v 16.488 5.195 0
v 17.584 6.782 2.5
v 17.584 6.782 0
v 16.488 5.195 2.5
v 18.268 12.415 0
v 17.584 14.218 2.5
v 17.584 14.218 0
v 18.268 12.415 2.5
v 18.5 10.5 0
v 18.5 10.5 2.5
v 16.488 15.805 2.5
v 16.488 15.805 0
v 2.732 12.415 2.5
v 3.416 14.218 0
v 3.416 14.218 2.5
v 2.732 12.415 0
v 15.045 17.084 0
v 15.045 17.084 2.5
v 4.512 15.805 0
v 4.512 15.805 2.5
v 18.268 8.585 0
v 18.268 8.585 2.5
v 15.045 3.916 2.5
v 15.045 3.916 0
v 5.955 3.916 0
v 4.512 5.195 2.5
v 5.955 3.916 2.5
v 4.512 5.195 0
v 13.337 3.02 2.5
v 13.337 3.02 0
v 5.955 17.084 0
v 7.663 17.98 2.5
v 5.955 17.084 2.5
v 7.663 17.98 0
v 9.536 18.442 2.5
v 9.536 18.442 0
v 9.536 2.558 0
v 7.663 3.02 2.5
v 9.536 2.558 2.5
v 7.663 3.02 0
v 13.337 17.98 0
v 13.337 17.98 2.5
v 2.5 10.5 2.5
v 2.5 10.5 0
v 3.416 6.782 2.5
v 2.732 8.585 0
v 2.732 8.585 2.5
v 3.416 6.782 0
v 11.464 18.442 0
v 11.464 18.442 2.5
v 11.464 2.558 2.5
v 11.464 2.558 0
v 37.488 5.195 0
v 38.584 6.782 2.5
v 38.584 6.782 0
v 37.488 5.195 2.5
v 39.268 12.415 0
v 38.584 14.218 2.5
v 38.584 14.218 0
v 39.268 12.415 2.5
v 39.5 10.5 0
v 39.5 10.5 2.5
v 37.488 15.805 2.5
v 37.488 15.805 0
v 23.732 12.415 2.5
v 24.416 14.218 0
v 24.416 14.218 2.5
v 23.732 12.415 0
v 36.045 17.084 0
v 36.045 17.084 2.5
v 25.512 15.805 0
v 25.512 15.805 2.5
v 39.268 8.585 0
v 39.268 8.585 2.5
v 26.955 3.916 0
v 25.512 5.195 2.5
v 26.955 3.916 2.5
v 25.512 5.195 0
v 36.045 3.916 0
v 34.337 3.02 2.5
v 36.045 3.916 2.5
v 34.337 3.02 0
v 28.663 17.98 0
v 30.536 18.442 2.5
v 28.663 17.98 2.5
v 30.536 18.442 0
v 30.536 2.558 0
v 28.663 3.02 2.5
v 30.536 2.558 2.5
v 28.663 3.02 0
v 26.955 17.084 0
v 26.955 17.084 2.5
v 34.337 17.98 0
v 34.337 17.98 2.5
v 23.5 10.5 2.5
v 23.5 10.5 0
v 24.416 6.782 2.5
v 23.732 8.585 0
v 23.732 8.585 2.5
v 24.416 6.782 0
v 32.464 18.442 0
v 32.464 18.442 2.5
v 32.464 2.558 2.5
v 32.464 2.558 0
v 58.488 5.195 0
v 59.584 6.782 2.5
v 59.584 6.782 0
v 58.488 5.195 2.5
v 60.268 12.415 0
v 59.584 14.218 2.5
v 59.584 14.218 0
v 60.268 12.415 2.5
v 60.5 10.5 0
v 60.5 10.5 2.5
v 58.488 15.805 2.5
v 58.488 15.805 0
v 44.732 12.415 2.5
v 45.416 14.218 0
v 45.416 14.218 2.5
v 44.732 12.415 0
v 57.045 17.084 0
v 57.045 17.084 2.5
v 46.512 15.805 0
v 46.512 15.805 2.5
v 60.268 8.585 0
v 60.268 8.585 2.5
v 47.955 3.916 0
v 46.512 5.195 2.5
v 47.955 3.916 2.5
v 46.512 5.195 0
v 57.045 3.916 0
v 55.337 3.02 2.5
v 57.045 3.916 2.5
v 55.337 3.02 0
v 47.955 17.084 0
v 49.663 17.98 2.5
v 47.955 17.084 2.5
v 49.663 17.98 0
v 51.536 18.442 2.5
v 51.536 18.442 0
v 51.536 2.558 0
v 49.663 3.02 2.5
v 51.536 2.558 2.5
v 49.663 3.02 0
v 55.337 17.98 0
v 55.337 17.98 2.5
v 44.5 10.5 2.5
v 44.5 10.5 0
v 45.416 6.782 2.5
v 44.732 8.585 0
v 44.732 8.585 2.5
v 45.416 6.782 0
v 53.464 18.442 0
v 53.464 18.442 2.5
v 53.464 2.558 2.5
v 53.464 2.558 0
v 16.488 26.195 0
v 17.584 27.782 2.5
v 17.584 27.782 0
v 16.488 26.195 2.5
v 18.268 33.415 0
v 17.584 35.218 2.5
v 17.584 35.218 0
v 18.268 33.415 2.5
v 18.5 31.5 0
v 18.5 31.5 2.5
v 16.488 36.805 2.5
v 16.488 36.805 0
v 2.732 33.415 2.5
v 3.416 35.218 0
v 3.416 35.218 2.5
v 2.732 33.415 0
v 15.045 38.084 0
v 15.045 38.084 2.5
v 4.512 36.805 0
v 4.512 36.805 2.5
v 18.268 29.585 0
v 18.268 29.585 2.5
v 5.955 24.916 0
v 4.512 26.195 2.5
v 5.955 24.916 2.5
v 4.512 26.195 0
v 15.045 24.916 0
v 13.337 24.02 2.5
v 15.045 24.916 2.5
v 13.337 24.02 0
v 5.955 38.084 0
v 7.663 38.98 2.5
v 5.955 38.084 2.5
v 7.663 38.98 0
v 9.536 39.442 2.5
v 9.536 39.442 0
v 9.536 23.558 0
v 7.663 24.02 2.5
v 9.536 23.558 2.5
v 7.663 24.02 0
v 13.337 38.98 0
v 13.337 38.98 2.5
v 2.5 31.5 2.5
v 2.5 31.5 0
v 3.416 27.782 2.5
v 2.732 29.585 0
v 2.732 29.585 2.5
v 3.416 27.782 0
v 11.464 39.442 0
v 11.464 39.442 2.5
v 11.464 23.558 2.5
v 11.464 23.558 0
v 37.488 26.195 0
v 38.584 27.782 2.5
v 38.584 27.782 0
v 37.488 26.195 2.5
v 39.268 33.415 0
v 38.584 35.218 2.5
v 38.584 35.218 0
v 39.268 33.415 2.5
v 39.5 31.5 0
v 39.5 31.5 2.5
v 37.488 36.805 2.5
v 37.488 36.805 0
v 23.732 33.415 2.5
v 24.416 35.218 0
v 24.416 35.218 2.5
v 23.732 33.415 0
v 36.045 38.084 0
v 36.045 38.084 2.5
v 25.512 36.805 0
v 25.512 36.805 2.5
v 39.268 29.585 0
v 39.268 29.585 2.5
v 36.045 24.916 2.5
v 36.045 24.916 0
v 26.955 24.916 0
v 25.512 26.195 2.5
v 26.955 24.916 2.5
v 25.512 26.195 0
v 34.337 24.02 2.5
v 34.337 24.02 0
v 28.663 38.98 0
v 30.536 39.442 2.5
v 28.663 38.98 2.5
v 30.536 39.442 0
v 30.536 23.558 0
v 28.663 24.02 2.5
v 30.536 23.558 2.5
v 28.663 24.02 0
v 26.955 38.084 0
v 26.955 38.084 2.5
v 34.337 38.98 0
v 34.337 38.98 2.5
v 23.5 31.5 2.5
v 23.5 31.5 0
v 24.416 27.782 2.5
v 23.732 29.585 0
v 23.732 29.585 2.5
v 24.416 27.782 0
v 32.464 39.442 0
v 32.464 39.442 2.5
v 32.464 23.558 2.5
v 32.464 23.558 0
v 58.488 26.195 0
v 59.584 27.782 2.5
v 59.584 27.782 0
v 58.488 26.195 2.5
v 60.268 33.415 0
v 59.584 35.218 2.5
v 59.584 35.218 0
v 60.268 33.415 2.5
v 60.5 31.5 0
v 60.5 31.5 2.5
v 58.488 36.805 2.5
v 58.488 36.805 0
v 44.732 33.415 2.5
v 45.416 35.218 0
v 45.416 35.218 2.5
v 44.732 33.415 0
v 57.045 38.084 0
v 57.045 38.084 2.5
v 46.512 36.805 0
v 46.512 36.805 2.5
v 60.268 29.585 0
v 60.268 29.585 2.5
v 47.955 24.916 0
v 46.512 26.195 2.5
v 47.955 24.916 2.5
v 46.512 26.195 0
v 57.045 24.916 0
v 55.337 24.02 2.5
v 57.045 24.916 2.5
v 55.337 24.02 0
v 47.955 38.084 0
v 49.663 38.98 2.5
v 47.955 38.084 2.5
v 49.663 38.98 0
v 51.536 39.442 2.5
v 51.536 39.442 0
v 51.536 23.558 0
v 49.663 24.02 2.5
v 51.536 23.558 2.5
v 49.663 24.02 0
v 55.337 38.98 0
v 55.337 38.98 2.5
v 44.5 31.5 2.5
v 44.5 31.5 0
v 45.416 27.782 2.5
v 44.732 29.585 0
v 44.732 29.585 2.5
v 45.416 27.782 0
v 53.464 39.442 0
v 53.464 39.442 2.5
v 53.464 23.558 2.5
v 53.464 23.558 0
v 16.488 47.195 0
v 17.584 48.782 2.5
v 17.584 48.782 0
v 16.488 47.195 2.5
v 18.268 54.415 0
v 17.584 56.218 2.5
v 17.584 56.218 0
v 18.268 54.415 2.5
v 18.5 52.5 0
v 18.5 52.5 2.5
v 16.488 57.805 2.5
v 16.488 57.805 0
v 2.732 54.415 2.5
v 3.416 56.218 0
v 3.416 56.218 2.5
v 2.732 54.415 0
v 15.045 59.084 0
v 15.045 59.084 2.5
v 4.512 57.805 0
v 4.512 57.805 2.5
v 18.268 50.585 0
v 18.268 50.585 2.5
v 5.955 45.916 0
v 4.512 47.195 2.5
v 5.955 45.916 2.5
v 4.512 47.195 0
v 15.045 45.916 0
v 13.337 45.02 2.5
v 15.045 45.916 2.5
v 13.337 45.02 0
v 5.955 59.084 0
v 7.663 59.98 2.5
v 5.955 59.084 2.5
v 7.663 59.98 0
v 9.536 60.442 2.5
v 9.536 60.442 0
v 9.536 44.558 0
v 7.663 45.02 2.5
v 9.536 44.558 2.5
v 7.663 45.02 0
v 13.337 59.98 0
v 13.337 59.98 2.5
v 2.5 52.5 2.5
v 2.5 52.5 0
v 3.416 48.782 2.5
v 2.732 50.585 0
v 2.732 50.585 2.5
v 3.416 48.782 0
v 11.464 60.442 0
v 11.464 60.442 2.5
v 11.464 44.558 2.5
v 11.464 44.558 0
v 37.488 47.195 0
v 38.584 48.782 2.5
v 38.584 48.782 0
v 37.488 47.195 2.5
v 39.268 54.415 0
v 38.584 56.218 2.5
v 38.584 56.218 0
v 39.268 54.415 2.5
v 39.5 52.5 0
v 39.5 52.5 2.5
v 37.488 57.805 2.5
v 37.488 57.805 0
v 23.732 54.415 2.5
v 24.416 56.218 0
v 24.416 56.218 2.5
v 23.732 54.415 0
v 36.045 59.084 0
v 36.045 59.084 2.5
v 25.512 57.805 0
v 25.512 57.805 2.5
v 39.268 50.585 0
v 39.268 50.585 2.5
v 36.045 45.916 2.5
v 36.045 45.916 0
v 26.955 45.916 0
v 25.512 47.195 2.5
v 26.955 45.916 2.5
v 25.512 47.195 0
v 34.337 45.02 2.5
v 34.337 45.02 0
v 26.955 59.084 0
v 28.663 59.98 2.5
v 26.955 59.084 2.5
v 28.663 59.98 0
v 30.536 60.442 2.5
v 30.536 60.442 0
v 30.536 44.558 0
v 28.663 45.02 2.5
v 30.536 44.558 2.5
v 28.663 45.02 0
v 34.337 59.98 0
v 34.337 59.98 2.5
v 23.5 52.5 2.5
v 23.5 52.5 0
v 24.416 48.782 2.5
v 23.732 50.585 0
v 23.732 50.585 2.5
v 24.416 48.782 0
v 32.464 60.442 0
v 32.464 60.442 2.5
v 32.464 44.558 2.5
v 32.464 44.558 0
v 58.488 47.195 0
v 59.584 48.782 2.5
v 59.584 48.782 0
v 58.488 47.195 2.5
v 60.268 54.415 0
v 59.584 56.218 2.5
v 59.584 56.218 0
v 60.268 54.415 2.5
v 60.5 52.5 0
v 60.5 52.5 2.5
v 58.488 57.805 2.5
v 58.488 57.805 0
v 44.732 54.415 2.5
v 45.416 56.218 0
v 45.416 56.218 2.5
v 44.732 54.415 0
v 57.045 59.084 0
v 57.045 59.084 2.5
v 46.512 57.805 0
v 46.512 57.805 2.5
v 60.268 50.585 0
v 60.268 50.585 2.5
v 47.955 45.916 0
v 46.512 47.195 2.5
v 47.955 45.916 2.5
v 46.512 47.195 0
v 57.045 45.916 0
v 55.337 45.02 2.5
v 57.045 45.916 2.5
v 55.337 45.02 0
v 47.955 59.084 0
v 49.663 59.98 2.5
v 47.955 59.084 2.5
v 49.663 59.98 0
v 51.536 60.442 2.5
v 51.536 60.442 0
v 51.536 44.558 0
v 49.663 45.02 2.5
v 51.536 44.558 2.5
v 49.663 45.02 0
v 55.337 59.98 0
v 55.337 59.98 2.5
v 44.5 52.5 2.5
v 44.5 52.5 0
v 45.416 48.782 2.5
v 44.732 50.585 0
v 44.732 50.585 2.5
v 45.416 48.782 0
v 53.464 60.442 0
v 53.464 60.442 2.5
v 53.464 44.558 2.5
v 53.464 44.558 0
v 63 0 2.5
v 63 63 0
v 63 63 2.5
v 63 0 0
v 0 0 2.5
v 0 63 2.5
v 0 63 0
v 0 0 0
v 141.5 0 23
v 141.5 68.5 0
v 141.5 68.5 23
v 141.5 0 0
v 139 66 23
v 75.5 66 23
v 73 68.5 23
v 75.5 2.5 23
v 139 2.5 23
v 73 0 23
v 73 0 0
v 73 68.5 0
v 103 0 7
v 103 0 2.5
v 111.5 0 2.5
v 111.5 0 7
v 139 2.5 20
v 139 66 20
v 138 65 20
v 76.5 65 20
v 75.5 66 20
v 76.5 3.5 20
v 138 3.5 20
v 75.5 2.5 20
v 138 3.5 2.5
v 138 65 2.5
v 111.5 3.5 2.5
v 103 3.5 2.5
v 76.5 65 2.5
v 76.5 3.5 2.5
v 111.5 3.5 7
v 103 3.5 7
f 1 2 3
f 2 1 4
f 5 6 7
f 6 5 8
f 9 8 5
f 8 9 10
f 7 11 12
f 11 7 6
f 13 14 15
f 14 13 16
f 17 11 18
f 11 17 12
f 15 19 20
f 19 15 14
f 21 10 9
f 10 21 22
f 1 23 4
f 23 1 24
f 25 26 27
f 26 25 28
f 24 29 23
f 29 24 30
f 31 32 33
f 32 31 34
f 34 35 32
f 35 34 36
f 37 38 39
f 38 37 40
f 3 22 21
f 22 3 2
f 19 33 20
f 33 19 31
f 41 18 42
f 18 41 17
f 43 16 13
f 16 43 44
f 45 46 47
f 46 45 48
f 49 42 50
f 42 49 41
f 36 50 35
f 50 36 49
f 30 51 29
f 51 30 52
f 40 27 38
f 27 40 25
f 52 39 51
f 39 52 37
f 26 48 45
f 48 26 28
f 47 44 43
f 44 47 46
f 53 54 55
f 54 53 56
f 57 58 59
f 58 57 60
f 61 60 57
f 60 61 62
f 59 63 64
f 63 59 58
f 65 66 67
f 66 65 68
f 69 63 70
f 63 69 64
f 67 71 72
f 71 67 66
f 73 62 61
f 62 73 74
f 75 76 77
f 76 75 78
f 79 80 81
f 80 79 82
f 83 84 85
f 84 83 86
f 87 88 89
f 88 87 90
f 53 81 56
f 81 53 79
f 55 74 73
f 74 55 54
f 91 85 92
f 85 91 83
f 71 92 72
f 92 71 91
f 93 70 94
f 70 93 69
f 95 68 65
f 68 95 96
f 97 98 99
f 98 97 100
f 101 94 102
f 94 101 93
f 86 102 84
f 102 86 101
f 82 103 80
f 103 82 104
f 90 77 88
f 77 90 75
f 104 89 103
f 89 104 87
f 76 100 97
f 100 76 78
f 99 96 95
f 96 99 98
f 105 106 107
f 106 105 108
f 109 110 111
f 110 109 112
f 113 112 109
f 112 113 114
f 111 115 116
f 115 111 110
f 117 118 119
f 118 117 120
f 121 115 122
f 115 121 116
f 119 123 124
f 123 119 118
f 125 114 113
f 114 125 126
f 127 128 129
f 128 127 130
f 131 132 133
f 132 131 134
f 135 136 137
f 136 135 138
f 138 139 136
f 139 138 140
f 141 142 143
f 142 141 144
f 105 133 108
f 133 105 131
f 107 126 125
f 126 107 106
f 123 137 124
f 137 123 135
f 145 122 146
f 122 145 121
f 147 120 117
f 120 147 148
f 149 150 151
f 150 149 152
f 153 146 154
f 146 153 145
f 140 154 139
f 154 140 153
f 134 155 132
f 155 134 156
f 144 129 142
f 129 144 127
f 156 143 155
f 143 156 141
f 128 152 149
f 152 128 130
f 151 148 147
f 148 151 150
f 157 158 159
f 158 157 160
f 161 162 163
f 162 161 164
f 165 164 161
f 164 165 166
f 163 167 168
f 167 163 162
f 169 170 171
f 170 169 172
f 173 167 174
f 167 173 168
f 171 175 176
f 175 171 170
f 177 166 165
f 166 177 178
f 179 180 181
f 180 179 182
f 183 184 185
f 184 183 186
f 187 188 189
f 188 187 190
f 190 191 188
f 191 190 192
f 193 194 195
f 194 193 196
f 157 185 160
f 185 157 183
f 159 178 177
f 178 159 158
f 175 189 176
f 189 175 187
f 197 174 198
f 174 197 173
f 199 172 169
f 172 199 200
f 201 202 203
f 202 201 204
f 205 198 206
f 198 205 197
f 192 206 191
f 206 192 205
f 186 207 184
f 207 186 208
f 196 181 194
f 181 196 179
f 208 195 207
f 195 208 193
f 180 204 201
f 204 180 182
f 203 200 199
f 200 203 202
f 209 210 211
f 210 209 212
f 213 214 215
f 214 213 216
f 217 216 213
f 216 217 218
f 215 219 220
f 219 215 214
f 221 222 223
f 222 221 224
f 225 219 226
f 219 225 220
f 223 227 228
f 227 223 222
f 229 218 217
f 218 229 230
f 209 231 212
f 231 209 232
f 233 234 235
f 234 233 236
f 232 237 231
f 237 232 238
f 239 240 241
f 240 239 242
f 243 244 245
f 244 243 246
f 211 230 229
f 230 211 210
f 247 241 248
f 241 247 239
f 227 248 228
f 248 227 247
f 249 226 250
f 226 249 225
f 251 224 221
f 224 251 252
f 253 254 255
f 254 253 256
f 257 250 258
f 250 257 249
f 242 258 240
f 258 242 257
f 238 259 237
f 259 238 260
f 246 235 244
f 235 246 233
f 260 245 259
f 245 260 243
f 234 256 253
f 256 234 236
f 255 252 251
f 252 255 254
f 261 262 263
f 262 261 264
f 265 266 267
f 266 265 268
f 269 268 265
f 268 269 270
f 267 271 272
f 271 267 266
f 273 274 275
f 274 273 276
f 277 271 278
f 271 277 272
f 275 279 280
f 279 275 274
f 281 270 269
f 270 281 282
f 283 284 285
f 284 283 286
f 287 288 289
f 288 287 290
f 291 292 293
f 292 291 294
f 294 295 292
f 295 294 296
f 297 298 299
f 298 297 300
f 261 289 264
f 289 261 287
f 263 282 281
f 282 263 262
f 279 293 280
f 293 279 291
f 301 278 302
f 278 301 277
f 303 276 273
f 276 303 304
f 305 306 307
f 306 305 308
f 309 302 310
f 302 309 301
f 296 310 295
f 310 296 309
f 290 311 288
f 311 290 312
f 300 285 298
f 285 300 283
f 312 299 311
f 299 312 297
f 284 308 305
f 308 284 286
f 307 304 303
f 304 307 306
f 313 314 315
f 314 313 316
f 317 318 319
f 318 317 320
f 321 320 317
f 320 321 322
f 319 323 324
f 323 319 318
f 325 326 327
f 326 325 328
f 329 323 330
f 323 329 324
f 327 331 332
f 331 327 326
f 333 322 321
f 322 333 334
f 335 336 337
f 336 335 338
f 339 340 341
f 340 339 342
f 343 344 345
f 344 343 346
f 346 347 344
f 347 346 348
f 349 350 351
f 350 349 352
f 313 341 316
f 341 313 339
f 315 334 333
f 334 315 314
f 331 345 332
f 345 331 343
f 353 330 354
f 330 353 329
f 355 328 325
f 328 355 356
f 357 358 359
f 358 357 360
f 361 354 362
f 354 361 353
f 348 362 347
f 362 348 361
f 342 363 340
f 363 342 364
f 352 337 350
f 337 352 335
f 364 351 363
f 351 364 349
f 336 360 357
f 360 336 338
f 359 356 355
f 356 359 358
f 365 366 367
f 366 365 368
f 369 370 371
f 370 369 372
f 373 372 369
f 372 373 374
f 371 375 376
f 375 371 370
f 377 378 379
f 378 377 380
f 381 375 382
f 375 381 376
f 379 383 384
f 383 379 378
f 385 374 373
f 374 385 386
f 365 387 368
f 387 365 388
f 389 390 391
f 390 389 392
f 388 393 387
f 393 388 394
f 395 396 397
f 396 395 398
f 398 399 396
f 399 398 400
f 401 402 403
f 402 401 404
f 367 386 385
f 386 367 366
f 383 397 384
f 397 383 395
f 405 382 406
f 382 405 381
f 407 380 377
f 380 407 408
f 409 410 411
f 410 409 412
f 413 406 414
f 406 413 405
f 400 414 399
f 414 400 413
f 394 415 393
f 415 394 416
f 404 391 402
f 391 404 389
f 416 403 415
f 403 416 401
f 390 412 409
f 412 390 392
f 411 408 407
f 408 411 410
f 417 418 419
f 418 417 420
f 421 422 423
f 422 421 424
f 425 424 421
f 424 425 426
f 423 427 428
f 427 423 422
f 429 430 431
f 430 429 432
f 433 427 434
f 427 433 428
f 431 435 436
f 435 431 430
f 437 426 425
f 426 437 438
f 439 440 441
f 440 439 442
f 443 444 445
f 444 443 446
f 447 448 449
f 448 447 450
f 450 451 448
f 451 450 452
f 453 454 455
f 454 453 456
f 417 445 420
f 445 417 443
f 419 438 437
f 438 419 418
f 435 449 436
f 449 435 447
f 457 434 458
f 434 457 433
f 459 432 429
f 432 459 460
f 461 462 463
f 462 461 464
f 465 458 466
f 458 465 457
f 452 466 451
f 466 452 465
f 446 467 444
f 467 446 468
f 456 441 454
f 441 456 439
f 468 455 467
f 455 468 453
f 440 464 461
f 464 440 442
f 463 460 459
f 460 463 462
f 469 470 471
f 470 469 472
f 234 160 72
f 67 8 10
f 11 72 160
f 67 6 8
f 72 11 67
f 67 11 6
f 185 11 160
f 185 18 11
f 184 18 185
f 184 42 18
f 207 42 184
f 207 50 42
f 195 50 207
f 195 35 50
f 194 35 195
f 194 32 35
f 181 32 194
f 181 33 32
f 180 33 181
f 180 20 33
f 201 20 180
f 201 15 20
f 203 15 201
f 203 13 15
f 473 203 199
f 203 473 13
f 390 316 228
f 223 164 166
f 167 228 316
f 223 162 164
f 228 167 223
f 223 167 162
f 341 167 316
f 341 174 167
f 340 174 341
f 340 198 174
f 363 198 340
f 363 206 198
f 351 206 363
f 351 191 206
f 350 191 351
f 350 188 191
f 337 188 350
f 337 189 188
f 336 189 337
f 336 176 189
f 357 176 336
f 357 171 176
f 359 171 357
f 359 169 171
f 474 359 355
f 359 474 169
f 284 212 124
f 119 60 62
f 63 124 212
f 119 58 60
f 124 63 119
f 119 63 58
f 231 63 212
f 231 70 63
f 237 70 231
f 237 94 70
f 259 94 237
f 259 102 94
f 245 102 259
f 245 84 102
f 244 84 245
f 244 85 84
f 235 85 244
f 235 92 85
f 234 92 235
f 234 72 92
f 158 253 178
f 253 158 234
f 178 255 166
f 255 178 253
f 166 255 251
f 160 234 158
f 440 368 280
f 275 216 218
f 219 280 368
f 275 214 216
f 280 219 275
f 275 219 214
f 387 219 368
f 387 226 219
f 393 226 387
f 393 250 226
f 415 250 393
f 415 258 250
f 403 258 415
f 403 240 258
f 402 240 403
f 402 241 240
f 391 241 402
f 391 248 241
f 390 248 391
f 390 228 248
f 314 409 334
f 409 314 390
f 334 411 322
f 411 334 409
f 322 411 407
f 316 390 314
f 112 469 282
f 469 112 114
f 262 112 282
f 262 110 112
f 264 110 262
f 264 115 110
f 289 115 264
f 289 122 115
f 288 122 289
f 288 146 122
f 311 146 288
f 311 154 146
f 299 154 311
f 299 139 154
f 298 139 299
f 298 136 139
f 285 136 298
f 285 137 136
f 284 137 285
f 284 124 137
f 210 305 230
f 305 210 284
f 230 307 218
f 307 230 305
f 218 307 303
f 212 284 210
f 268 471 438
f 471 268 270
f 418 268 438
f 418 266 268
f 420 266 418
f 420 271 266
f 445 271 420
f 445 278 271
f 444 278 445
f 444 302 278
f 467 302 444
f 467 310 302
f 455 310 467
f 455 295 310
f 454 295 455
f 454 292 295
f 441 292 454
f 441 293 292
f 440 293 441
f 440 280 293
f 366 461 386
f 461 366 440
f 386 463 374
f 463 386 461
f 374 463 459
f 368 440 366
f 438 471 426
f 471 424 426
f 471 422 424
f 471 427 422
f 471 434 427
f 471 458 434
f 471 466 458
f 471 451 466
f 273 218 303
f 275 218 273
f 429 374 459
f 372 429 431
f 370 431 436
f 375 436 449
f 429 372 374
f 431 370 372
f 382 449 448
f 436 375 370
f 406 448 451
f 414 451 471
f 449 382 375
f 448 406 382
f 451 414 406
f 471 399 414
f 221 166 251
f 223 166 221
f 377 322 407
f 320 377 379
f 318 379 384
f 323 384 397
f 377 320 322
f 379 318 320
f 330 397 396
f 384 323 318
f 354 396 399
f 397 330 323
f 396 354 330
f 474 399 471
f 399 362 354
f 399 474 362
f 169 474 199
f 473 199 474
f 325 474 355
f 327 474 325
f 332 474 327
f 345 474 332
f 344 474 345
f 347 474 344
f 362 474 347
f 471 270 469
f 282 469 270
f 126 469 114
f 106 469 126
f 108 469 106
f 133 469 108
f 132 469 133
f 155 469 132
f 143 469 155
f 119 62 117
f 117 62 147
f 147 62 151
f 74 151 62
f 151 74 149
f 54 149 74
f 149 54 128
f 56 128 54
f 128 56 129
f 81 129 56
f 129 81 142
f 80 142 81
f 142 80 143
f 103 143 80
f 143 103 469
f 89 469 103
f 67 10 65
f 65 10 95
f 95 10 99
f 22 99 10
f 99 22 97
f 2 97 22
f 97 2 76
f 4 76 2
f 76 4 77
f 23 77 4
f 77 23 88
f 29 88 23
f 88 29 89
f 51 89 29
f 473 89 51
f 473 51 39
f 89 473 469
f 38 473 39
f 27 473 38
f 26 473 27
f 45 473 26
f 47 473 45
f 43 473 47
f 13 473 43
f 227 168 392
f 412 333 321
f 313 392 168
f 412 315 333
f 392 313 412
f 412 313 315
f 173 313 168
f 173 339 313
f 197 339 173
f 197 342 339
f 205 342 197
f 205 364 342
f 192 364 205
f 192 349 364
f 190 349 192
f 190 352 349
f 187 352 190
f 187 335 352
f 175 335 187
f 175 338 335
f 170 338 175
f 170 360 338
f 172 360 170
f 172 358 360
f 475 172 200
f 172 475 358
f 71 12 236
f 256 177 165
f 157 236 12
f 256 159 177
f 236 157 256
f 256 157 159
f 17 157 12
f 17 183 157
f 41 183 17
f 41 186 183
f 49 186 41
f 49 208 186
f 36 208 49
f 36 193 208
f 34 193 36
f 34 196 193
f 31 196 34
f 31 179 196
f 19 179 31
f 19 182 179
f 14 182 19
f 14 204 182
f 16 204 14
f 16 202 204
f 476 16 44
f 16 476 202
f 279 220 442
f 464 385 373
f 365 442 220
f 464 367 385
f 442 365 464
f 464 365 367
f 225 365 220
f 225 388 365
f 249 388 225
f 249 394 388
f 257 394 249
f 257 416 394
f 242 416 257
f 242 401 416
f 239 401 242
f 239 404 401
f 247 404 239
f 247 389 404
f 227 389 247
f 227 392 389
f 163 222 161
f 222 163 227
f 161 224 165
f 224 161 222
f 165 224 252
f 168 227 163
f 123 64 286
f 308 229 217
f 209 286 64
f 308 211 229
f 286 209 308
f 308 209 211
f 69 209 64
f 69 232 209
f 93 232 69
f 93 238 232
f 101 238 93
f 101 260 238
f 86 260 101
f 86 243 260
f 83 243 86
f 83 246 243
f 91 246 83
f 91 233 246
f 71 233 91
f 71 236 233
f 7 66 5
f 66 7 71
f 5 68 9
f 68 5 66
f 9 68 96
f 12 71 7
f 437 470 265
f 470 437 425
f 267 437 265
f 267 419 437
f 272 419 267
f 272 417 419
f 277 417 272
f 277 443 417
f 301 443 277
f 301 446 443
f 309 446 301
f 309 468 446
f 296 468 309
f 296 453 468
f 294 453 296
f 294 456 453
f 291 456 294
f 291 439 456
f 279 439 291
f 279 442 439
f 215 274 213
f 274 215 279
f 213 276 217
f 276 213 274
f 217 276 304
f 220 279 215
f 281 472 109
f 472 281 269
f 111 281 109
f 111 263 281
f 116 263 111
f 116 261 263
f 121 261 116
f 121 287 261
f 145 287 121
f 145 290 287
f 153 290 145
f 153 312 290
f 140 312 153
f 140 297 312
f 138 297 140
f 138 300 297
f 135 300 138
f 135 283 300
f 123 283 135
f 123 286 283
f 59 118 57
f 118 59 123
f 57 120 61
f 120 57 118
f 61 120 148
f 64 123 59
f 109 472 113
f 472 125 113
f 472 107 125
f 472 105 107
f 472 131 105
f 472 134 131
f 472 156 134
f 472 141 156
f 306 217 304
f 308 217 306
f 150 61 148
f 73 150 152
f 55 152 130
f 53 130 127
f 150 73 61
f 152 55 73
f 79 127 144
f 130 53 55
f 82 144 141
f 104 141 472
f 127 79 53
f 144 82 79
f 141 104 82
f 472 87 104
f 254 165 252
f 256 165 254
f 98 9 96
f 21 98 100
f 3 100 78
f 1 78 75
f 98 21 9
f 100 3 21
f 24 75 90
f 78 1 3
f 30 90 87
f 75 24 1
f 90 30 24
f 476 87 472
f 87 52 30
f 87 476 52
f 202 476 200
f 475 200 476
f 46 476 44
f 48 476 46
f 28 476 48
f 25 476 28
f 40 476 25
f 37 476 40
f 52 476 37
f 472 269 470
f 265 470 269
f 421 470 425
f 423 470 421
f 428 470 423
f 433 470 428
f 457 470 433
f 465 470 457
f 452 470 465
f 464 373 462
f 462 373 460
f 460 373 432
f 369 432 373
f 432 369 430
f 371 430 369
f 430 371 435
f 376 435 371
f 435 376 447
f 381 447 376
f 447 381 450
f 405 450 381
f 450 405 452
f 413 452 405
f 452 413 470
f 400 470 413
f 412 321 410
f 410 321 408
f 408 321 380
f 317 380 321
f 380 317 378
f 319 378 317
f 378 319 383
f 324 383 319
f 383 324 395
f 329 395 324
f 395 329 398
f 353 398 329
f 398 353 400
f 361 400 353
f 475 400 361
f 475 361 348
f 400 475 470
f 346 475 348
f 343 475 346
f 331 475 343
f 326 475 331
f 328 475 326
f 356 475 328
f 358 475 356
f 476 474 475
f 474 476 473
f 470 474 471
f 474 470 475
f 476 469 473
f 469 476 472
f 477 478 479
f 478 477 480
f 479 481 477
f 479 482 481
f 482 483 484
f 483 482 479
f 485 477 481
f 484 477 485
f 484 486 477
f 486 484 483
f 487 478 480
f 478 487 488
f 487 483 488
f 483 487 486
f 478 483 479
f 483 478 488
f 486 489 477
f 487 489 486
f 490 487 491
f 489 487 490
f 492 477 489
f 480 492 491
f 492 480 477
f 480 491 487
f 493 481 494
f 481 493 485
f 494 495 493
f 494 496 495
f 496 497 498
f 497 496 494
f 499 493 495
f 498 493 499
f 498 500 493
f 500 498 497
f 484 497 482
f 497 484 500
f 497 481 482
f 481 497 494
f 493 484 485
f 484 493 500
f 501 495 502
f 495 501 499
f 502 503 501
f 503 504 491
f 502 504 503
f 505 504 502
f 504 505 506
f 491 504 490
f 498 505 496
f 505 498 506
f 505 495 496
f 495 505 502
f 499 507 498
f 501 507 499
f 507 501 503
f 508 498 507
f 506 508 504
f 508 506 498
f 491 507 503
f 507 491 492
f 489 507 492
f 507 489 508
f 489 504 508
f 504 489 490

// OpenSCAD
// Uncomment before final render
//$fa = 0.01;
//$fs = 0.25;

// Configurable values
GRID_SIZE = [3, 3];
HOLE_DIAMETER = 15.5;
HOLE_DISTANCE = 5;
WALL_WIDTH = 2.5;
INTERNAL_HEIGHT = 17.5;
USB_PORT_WIDTH = 8;
USB_PORT_HEIGHT = 4;

// Calculated values
HOLE_DIAMETER_WITH_TOLERANCE = HOLE_DIAMETER + 0.5;
WIDTH_TOP = GRID_SIZE[0] * (HOLE_DIAMETER_WITH_TOLERANCE + HOLE_DISTANCE);
WIDTH_TOP_WITH_TOLERANCE = WIDTH_TOP + 0.5;
LENTGH_TOP = GRID_SIZE[1] * (HOLE_DIAMETER_WITH_TOLERANCE + HOLE_DISTANCE);
LENTGH_TOP_WITH_TOLERANCE = LENTGH_TOP + 0.5;
INTERNAL_HEIGHT_WITH_TOLERANCE = INTERNAL_HEIGHT + 0.5;
USB_PORT_WIDTH_WITH_TOLERANCE = USB_PORT_WIDTH + 0.5;
USB_PORT_HEIGHT_WITH_TOLERANCE = USB_PORT_HEIGHT + 0.5;

module top(args) {
    difference() {
        // Base plate
        cube(size = [WIDTH_TOP, LENTGH_TOP, WALL_WIDTH]);
        // Holes
        for (i = [0:GRID_SIZE[1] - 1]) {
            for (j = [0:GRID_SIZE[0] - 1]) {
                translate([(HOLE_DISTANCE / 2) + (HOLE_DISTANCE * j) + (HOLE_DIAMETER_WITH_TOLERANCE * j), (HOLE_DISTANCE / 2) + (HOLE_DISTANCE * i) + (HOLE_DIAMETER_WITH_TOLERANCE * i), 0]) {
                    translate([HOLE_DIAMETER_WITH_TOLERANCE / 2, HOLE_DIAMETER_WITH_TOLERANCE / 2, -1]) {
                        cylinder(d = HOLE_DIAMETER_WITH_TOLERANCE, h = WALL_WIDTH + 2);
                    }
                }
            }
        }
    }
}

module base(args) {
    difference() {
        cube([WIDTH_TOP_WITH_TOLERANCE + (WALL_WIDTH * 2), LENTGH_TOP_WITH_TOLERANCE + (WALL_WIDTH * 2), INTERNAL_HEIGHT_WITH_TOLERANCE + (WALL_WIDTH * 2)]);
        // Top cutout
        translate([WALL_WIDTH, WALL_WIDTH, INTERNAL_HEIGHT + WALL_WIDTH]) {
            cube(size = [WIDTH_TOP_WITH_TOLERANCE, LENTGH_TOP_WITH_TOLERANCE, WALL_WIDTH + 1.5]);
        }
        // Internals cutout
        translate([WALL_WIDTH + 1, WALL_WIDTH + 1, WALL_WIDTH]) {
            cube(size = [WIDTH_TOP_WITH_TOLERANCE - 2, LENTGH_TOP_WITH_TOLERANCE - 2, INTERNAL_HEIGHT_WITH_TOLERANCE + WALL_WIDTH + 1]);
        }
        // USB port cutout
        translate([((WIDTH_TOP_WITH_TOLERANCE + (WALL_WIDTH * 2)) / 2) - (USB_PORT_WIDTH_WITH_TOLERANCE / 2), -1, WALL_WIDTH]) {
            cube(size = [USB_PORT_WIDTH_WITH_TOLERANCE, WALL_WIDTH + 3, USB_PORT_HEIGHT_WITH_TOLERANCE]);
        }
    }
}

top();
translate([WIDTH_TOP + 10, 0, 0]) {
    base();
}
